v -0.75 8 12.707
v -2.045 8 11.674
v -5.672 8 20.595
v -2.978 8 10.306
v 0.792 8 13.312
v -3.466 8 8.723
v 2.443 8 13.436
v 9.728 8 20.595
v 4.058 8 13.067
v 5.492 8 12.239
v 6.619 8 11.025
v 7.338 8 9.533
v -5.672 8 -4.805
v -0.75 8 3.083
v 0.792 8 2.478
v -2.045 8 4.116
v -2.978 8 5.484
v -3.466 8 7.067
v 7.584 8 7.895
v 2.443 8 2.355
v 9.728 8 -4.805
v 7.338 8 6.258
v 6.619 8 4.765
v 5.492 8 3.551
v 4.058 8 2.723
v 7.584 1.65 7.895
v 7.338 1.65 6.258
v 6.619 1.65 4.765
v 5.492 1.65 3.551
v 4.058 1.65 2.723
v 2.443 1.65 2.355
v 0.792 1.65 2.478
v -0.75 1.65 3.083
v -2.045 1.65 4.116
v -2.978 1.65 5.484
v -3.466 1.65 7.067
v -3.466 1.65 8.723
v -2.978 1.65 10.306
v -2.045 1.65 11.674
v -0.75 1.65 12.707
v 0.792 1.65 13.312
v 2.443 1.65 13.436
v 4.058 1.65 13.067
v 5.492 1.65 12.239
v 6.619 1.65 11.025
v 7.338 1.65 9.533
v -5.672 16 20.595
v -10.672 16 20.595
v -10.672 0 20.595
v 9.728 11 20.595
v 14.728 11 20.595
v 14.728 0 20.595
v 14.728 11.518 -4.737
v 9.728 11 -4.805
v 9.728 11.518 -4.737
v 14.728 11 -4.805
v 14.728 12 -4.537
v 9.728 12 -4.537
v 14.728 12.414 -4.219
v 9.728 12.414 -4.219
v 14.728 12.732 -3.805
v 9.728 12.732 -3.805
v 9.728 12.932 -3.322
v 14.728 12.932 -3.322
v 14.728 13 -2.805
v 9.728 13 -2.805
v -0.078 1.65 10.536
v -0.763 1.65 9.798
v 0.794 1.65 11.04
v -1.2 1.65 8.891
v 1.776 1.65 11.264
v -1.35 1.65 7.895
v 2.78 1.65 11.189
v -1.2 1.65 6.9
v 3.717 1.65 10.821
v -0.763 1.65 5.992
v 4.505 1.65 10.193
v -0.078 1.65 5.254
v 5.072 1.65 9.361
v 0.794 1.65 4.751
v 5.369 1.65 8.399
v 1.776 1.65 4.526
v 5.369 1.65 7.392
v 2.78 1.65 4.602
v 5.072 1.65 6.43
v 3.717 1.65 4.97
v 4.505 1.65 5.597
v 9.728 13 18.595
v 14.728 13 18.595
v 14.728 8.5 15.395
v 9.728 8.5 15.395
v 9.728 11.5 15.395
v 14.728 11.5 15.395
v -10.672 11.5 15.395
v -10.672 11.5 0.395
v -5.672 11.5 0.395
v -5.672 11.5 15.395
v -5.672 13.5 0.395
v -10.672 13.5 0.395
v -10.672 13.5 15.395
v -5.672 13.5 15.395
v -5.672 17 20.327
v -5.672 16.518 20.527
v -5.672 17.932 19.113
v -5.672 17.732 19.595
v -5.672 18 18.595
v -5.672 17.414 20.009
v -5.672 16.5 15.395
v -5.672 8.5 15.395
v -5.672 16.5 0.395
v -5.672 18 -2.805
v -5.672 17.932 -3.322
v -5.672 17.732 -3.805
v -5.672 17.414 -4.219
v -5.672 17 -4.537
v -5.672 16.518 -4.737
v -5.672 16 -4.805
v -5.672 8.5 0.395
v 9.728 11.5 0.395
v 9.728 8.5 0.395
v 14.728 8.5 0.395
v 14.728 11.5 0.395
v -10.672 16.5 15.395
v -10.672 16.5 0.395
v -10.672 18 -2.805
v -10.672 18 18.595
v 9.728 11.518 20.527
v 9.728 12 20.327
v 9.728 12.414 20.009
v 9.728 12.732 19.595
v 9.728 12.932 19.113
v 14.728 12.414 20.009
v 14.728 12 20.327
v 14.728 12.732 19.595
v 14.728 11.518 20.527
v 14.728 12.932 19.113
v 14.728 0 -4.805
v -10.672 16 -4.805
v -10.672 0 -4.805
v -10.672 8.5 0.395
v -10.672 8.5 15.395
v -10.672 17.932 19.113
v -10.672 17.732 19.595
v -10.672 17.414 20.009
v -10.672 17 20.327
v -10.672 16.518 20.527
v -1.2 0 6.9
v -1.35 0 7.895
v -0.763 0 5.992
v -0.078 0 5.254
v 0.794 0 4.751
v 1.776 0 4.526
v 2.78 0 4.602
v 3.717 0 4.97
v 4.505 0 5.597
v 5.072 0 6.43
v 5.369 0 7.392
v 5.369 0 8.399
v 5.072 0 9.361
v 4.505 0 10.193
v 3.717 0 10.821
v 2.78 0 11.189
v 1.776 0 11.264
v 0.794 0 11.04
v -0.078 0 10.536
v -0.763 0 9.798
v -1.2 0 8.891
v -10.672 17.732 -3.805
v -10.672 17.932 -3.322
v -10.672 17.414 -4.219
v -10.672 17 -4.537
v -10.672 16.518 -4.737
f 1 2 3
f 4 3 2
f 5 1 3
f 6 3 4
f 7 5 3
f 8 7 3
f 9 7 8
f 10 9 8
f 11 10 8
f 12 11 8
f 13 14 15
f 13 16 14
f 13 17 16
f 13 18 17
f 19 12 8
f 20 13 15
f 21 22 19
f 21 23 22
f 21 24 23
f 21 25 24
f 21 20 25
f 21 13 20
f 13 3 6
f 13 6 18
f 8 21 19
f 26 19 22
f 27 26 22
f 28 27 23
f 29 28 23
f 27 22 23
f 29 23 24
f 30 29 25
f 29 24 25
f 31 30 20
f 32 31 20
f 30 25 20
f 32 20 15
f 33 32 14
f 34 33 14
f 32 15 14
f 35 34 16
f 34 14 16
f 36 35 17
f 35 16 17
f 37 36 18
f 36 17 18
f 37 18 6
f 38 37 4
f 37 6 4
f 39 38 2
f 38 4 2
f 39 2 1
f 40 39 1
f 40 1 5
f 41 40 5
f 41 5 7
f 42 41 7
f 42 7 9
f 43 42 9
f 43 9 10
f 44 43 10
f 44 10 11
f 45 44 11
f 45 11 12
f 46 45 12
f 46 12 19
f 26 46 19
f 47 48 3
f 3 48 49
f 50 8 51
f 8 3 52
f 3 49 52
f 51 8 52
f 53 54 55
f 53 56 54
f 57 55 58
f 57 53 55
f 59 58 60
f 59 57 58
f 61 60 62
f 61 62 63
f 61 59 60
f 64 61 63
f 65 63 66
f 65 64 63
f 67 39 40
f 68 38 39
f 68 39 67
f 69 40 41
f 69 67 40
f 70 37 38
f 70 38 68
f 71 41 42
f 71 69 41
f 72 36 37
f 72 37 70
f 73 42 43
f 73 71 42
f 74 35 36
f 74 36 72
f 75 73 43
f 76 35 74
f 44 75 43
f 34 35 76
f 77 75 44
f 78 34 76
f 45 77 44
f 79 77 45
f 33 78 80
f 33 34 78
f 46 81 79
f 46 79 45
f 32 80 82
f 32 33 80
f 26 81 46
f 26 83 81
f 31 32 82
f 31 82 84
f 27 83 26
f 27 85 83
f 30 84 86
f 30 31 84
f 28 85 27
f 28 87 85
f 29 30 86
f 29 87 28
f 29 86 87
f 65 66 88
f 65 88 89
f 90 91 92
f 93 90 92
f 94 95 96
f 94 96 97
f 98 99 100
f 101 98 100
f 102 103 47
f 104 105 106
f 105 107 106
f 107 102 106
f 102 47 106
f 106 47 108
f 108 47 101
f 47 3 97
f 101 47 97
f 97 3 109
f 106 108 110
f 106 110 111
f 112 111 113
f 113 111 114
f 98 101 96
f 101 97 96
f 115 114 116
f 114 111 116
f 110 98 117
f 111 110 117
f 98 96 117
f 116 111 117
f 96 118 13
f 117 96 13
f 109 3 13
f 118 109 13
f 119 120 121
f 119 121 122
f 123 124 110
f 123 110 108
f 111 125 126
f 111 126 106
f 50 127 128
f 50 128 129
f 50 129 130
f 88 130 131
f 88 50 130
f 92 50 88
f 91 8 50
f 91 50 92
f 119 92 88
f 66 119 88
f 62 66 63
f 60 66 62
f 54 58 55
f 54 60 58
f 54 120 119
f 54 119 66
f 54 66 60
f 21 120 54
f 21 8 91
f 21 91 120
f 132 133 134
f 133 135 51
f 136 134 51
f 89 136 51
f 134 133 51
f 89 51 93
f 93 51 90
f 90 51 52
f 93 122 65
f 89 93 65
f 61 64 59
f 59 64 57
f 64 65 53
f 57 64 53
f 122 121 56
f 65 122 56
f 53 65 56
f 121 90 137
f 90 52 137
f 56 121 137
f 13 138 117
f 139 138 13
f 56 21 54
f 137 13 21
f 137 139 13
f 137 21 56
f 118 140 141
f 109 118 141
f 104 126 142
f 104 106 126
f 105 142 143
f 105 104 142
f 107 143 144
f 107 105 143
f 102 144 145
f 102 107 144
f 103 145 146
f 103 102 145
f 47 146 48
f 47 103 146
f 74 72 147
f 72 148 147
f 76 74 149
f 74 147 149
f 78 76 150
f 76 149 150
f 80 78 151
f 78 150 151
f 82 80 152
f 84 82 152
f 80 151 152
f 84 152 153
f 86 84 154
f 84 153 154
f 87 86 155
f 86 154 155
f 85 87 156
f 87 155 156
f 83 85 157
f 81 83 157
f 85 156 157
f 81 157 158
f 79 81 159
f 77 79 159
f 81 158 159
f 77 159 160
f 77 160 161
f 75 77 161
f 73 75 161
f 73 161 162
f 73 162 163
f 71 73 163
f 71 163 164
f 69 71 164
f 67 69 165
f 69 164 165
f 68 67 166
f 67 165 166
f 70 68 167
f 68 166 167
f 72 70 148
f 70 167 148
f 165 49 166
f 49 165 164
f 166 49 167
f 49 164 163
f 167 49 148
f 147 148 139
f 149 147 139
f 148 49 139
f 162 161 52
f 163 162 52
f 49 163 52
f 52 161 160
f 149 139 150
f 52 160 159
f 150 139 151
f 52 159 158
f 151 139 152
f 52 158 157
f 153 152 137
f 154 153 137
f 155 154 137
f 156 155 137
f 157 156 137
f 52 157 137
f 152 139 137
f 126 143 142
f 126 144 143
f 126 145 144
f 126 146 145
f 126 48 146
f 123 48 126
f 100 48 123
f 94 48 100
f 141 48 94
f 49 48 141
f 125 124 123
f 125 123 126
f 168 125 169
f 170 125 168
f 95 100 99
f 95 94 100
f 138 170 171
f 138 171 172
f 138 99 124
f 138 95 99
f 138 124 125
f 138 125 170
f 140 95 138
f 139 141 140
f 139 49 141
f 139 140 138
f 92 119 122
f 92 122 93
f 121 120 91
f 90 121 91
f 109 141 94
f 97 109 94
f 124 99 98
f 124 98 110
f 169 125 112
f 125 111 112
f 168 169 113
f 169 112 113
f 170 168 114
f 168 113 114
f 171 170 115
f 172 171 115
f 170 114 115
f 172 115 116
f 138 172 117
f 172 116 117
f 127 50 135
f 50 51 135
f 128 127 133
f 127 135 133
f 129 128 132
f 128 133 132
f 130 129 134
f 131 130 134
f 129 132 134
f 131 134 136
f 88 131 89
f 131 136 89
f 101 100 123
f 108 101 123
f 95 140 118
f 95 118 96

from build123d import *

# Parameters (mm, degrees)
SKETCH1_W                                        = 25.4
SKETCH1_H                                        = 25.4
BOSS_EXTRUDE1_DEPTH                              = 8
SKETCH2_W                                        = 5
SKETCH2_H                                        = 25.4
BOSS_EXTRUDE2_DEPTH                              = 5
CBORE_FOR_1_4_SOCKET_HEAD_CAP_SCREW1_D           = 6.7564
CBORE_FOR_1_4_SOCKET_HEAD_CAP_SCREW1_CBORE_D     = 11.1125
CBORE_FOR_1_4_SOCKET_HEAD_CAP_SCREW1_CBORE_DEPTH = 6.35
SKETCH5_W                                        = 15
SKETCH5_H                                        = 3
CUT_EXTRUDE1_DEPTH                               = 36.18983099
SKETCH6_W                                        = 5
SKETCH6_H                                        = 25.4
BOSS_EXTRUDE3_DEPTH                              = 5
SKETCH7_W                                        = 15
SKETCH7_H                                        = 3
CUT_EXTRUDE2_DEPTH                               = 38.327258205
FILLET1_R                                        = 2


with BuildPart() as part:
    # Sketch1 → Boss-Extrude1 (new body)
    with BuildSketch(Plane(origin=(0, 0, 0), x_dir=(1, 0, 0), z_dir=(0, 1, 0))):
        with Locations((2.028136882, -7.895247148)):
            Rectangle(SKETCH1_W, SKETCH1_H)
    extrude(amount=BOSS_EXTRUDE1_DEPTH)

    # Sketch2 → Boss-Extrude2 (add)
    with BuildSketch(Plane(origin=(0, 8, 0), x_dir=(1, 0, 0), z_dir=(0, 1, 0))):
        with Locations((-8.171863118, -7.895247148)):
            Rectangle(SKETCH2_W, SKETCH2_H)
        with Locations((12.228136882, -7.895247148)):
            Rectangle(SKETCH2_W, SKETCH2_H)
    extrude(amount=BOSS_EXTRUDE2_DEPTH)

    # CBORE for 1/4 Socket Head Cap Screw1 (through all)
    with Locations(Plane(origin=(0, 8, 0), x_dir=(1, 0, 0), z_dir=(0, 1, 0))):
        with Locations((22.31346114, -3.943712885), (2.028136882, -7.895247148)):
            CounterBoreHole(CBORE_FOR_1_4_SOCKET_HEAD_CAP_SCREW1_D / 2, CBORE_FOR_1_4_SOCKET_HEAD_CAP_SCREW1_CBORE_D / 2, CBORE_FOR_1_4_SOCKET_HEAD_CAP_SCREW1_CBORE_DEPTH)

    # Sketch5 → Cut-Extrude1 (cut, through all)
    with BuildSketch(Plane.ZY.offset(10.671863118)):
        with Locations((7.895247148, 10)):
            Rectangle(SKETCH5_W, SKETCH5_H)
    extrude(amount=-CUT_EXTRUDE1_DEPTH, mode=Mode.SUBTRACT)

    # Sketch6 → Boss-Extrude3 (add)
    with BuildSketch(Plane(origin=(0, 13, 0), x_dir=(1, 0, 0), z_dir=(0, 1, 0))):
        with Locations((-8.171863118, -7.895247148)):
            Rectangle(SKETCH6_W, SKETCH6_H)
    extrude(amount=BOSS_EXTRUDE3_DEPTH)

    # Sketch7 → Cut-Extrude2 (cut, through all)
    with BuildSketch(Plane.ZY.offset(10.671863118)):
        with Locations((7.895247148, 15)):
            Rectangle(SKETCH7_W, SKETCH7_H)
    extrude(amount=-CUT_EXTRUDE2_DEPTH, mode=Mode.SUBTRACT)

    # Fillet1
    fillet1_edges = [part.edges().sort_by_distance(p)[0] for p in [
        (12.228136882, 13, -4.804752852),
        (12.228136882, 13, 20.595247148),
        (-8.171863118, 18, -4.804752852),
        (-8.171863118, 18, 20.595247148),
    ]]
    fillet(fillet1_edges, radius=FILLET1_R)


solid = part.part
